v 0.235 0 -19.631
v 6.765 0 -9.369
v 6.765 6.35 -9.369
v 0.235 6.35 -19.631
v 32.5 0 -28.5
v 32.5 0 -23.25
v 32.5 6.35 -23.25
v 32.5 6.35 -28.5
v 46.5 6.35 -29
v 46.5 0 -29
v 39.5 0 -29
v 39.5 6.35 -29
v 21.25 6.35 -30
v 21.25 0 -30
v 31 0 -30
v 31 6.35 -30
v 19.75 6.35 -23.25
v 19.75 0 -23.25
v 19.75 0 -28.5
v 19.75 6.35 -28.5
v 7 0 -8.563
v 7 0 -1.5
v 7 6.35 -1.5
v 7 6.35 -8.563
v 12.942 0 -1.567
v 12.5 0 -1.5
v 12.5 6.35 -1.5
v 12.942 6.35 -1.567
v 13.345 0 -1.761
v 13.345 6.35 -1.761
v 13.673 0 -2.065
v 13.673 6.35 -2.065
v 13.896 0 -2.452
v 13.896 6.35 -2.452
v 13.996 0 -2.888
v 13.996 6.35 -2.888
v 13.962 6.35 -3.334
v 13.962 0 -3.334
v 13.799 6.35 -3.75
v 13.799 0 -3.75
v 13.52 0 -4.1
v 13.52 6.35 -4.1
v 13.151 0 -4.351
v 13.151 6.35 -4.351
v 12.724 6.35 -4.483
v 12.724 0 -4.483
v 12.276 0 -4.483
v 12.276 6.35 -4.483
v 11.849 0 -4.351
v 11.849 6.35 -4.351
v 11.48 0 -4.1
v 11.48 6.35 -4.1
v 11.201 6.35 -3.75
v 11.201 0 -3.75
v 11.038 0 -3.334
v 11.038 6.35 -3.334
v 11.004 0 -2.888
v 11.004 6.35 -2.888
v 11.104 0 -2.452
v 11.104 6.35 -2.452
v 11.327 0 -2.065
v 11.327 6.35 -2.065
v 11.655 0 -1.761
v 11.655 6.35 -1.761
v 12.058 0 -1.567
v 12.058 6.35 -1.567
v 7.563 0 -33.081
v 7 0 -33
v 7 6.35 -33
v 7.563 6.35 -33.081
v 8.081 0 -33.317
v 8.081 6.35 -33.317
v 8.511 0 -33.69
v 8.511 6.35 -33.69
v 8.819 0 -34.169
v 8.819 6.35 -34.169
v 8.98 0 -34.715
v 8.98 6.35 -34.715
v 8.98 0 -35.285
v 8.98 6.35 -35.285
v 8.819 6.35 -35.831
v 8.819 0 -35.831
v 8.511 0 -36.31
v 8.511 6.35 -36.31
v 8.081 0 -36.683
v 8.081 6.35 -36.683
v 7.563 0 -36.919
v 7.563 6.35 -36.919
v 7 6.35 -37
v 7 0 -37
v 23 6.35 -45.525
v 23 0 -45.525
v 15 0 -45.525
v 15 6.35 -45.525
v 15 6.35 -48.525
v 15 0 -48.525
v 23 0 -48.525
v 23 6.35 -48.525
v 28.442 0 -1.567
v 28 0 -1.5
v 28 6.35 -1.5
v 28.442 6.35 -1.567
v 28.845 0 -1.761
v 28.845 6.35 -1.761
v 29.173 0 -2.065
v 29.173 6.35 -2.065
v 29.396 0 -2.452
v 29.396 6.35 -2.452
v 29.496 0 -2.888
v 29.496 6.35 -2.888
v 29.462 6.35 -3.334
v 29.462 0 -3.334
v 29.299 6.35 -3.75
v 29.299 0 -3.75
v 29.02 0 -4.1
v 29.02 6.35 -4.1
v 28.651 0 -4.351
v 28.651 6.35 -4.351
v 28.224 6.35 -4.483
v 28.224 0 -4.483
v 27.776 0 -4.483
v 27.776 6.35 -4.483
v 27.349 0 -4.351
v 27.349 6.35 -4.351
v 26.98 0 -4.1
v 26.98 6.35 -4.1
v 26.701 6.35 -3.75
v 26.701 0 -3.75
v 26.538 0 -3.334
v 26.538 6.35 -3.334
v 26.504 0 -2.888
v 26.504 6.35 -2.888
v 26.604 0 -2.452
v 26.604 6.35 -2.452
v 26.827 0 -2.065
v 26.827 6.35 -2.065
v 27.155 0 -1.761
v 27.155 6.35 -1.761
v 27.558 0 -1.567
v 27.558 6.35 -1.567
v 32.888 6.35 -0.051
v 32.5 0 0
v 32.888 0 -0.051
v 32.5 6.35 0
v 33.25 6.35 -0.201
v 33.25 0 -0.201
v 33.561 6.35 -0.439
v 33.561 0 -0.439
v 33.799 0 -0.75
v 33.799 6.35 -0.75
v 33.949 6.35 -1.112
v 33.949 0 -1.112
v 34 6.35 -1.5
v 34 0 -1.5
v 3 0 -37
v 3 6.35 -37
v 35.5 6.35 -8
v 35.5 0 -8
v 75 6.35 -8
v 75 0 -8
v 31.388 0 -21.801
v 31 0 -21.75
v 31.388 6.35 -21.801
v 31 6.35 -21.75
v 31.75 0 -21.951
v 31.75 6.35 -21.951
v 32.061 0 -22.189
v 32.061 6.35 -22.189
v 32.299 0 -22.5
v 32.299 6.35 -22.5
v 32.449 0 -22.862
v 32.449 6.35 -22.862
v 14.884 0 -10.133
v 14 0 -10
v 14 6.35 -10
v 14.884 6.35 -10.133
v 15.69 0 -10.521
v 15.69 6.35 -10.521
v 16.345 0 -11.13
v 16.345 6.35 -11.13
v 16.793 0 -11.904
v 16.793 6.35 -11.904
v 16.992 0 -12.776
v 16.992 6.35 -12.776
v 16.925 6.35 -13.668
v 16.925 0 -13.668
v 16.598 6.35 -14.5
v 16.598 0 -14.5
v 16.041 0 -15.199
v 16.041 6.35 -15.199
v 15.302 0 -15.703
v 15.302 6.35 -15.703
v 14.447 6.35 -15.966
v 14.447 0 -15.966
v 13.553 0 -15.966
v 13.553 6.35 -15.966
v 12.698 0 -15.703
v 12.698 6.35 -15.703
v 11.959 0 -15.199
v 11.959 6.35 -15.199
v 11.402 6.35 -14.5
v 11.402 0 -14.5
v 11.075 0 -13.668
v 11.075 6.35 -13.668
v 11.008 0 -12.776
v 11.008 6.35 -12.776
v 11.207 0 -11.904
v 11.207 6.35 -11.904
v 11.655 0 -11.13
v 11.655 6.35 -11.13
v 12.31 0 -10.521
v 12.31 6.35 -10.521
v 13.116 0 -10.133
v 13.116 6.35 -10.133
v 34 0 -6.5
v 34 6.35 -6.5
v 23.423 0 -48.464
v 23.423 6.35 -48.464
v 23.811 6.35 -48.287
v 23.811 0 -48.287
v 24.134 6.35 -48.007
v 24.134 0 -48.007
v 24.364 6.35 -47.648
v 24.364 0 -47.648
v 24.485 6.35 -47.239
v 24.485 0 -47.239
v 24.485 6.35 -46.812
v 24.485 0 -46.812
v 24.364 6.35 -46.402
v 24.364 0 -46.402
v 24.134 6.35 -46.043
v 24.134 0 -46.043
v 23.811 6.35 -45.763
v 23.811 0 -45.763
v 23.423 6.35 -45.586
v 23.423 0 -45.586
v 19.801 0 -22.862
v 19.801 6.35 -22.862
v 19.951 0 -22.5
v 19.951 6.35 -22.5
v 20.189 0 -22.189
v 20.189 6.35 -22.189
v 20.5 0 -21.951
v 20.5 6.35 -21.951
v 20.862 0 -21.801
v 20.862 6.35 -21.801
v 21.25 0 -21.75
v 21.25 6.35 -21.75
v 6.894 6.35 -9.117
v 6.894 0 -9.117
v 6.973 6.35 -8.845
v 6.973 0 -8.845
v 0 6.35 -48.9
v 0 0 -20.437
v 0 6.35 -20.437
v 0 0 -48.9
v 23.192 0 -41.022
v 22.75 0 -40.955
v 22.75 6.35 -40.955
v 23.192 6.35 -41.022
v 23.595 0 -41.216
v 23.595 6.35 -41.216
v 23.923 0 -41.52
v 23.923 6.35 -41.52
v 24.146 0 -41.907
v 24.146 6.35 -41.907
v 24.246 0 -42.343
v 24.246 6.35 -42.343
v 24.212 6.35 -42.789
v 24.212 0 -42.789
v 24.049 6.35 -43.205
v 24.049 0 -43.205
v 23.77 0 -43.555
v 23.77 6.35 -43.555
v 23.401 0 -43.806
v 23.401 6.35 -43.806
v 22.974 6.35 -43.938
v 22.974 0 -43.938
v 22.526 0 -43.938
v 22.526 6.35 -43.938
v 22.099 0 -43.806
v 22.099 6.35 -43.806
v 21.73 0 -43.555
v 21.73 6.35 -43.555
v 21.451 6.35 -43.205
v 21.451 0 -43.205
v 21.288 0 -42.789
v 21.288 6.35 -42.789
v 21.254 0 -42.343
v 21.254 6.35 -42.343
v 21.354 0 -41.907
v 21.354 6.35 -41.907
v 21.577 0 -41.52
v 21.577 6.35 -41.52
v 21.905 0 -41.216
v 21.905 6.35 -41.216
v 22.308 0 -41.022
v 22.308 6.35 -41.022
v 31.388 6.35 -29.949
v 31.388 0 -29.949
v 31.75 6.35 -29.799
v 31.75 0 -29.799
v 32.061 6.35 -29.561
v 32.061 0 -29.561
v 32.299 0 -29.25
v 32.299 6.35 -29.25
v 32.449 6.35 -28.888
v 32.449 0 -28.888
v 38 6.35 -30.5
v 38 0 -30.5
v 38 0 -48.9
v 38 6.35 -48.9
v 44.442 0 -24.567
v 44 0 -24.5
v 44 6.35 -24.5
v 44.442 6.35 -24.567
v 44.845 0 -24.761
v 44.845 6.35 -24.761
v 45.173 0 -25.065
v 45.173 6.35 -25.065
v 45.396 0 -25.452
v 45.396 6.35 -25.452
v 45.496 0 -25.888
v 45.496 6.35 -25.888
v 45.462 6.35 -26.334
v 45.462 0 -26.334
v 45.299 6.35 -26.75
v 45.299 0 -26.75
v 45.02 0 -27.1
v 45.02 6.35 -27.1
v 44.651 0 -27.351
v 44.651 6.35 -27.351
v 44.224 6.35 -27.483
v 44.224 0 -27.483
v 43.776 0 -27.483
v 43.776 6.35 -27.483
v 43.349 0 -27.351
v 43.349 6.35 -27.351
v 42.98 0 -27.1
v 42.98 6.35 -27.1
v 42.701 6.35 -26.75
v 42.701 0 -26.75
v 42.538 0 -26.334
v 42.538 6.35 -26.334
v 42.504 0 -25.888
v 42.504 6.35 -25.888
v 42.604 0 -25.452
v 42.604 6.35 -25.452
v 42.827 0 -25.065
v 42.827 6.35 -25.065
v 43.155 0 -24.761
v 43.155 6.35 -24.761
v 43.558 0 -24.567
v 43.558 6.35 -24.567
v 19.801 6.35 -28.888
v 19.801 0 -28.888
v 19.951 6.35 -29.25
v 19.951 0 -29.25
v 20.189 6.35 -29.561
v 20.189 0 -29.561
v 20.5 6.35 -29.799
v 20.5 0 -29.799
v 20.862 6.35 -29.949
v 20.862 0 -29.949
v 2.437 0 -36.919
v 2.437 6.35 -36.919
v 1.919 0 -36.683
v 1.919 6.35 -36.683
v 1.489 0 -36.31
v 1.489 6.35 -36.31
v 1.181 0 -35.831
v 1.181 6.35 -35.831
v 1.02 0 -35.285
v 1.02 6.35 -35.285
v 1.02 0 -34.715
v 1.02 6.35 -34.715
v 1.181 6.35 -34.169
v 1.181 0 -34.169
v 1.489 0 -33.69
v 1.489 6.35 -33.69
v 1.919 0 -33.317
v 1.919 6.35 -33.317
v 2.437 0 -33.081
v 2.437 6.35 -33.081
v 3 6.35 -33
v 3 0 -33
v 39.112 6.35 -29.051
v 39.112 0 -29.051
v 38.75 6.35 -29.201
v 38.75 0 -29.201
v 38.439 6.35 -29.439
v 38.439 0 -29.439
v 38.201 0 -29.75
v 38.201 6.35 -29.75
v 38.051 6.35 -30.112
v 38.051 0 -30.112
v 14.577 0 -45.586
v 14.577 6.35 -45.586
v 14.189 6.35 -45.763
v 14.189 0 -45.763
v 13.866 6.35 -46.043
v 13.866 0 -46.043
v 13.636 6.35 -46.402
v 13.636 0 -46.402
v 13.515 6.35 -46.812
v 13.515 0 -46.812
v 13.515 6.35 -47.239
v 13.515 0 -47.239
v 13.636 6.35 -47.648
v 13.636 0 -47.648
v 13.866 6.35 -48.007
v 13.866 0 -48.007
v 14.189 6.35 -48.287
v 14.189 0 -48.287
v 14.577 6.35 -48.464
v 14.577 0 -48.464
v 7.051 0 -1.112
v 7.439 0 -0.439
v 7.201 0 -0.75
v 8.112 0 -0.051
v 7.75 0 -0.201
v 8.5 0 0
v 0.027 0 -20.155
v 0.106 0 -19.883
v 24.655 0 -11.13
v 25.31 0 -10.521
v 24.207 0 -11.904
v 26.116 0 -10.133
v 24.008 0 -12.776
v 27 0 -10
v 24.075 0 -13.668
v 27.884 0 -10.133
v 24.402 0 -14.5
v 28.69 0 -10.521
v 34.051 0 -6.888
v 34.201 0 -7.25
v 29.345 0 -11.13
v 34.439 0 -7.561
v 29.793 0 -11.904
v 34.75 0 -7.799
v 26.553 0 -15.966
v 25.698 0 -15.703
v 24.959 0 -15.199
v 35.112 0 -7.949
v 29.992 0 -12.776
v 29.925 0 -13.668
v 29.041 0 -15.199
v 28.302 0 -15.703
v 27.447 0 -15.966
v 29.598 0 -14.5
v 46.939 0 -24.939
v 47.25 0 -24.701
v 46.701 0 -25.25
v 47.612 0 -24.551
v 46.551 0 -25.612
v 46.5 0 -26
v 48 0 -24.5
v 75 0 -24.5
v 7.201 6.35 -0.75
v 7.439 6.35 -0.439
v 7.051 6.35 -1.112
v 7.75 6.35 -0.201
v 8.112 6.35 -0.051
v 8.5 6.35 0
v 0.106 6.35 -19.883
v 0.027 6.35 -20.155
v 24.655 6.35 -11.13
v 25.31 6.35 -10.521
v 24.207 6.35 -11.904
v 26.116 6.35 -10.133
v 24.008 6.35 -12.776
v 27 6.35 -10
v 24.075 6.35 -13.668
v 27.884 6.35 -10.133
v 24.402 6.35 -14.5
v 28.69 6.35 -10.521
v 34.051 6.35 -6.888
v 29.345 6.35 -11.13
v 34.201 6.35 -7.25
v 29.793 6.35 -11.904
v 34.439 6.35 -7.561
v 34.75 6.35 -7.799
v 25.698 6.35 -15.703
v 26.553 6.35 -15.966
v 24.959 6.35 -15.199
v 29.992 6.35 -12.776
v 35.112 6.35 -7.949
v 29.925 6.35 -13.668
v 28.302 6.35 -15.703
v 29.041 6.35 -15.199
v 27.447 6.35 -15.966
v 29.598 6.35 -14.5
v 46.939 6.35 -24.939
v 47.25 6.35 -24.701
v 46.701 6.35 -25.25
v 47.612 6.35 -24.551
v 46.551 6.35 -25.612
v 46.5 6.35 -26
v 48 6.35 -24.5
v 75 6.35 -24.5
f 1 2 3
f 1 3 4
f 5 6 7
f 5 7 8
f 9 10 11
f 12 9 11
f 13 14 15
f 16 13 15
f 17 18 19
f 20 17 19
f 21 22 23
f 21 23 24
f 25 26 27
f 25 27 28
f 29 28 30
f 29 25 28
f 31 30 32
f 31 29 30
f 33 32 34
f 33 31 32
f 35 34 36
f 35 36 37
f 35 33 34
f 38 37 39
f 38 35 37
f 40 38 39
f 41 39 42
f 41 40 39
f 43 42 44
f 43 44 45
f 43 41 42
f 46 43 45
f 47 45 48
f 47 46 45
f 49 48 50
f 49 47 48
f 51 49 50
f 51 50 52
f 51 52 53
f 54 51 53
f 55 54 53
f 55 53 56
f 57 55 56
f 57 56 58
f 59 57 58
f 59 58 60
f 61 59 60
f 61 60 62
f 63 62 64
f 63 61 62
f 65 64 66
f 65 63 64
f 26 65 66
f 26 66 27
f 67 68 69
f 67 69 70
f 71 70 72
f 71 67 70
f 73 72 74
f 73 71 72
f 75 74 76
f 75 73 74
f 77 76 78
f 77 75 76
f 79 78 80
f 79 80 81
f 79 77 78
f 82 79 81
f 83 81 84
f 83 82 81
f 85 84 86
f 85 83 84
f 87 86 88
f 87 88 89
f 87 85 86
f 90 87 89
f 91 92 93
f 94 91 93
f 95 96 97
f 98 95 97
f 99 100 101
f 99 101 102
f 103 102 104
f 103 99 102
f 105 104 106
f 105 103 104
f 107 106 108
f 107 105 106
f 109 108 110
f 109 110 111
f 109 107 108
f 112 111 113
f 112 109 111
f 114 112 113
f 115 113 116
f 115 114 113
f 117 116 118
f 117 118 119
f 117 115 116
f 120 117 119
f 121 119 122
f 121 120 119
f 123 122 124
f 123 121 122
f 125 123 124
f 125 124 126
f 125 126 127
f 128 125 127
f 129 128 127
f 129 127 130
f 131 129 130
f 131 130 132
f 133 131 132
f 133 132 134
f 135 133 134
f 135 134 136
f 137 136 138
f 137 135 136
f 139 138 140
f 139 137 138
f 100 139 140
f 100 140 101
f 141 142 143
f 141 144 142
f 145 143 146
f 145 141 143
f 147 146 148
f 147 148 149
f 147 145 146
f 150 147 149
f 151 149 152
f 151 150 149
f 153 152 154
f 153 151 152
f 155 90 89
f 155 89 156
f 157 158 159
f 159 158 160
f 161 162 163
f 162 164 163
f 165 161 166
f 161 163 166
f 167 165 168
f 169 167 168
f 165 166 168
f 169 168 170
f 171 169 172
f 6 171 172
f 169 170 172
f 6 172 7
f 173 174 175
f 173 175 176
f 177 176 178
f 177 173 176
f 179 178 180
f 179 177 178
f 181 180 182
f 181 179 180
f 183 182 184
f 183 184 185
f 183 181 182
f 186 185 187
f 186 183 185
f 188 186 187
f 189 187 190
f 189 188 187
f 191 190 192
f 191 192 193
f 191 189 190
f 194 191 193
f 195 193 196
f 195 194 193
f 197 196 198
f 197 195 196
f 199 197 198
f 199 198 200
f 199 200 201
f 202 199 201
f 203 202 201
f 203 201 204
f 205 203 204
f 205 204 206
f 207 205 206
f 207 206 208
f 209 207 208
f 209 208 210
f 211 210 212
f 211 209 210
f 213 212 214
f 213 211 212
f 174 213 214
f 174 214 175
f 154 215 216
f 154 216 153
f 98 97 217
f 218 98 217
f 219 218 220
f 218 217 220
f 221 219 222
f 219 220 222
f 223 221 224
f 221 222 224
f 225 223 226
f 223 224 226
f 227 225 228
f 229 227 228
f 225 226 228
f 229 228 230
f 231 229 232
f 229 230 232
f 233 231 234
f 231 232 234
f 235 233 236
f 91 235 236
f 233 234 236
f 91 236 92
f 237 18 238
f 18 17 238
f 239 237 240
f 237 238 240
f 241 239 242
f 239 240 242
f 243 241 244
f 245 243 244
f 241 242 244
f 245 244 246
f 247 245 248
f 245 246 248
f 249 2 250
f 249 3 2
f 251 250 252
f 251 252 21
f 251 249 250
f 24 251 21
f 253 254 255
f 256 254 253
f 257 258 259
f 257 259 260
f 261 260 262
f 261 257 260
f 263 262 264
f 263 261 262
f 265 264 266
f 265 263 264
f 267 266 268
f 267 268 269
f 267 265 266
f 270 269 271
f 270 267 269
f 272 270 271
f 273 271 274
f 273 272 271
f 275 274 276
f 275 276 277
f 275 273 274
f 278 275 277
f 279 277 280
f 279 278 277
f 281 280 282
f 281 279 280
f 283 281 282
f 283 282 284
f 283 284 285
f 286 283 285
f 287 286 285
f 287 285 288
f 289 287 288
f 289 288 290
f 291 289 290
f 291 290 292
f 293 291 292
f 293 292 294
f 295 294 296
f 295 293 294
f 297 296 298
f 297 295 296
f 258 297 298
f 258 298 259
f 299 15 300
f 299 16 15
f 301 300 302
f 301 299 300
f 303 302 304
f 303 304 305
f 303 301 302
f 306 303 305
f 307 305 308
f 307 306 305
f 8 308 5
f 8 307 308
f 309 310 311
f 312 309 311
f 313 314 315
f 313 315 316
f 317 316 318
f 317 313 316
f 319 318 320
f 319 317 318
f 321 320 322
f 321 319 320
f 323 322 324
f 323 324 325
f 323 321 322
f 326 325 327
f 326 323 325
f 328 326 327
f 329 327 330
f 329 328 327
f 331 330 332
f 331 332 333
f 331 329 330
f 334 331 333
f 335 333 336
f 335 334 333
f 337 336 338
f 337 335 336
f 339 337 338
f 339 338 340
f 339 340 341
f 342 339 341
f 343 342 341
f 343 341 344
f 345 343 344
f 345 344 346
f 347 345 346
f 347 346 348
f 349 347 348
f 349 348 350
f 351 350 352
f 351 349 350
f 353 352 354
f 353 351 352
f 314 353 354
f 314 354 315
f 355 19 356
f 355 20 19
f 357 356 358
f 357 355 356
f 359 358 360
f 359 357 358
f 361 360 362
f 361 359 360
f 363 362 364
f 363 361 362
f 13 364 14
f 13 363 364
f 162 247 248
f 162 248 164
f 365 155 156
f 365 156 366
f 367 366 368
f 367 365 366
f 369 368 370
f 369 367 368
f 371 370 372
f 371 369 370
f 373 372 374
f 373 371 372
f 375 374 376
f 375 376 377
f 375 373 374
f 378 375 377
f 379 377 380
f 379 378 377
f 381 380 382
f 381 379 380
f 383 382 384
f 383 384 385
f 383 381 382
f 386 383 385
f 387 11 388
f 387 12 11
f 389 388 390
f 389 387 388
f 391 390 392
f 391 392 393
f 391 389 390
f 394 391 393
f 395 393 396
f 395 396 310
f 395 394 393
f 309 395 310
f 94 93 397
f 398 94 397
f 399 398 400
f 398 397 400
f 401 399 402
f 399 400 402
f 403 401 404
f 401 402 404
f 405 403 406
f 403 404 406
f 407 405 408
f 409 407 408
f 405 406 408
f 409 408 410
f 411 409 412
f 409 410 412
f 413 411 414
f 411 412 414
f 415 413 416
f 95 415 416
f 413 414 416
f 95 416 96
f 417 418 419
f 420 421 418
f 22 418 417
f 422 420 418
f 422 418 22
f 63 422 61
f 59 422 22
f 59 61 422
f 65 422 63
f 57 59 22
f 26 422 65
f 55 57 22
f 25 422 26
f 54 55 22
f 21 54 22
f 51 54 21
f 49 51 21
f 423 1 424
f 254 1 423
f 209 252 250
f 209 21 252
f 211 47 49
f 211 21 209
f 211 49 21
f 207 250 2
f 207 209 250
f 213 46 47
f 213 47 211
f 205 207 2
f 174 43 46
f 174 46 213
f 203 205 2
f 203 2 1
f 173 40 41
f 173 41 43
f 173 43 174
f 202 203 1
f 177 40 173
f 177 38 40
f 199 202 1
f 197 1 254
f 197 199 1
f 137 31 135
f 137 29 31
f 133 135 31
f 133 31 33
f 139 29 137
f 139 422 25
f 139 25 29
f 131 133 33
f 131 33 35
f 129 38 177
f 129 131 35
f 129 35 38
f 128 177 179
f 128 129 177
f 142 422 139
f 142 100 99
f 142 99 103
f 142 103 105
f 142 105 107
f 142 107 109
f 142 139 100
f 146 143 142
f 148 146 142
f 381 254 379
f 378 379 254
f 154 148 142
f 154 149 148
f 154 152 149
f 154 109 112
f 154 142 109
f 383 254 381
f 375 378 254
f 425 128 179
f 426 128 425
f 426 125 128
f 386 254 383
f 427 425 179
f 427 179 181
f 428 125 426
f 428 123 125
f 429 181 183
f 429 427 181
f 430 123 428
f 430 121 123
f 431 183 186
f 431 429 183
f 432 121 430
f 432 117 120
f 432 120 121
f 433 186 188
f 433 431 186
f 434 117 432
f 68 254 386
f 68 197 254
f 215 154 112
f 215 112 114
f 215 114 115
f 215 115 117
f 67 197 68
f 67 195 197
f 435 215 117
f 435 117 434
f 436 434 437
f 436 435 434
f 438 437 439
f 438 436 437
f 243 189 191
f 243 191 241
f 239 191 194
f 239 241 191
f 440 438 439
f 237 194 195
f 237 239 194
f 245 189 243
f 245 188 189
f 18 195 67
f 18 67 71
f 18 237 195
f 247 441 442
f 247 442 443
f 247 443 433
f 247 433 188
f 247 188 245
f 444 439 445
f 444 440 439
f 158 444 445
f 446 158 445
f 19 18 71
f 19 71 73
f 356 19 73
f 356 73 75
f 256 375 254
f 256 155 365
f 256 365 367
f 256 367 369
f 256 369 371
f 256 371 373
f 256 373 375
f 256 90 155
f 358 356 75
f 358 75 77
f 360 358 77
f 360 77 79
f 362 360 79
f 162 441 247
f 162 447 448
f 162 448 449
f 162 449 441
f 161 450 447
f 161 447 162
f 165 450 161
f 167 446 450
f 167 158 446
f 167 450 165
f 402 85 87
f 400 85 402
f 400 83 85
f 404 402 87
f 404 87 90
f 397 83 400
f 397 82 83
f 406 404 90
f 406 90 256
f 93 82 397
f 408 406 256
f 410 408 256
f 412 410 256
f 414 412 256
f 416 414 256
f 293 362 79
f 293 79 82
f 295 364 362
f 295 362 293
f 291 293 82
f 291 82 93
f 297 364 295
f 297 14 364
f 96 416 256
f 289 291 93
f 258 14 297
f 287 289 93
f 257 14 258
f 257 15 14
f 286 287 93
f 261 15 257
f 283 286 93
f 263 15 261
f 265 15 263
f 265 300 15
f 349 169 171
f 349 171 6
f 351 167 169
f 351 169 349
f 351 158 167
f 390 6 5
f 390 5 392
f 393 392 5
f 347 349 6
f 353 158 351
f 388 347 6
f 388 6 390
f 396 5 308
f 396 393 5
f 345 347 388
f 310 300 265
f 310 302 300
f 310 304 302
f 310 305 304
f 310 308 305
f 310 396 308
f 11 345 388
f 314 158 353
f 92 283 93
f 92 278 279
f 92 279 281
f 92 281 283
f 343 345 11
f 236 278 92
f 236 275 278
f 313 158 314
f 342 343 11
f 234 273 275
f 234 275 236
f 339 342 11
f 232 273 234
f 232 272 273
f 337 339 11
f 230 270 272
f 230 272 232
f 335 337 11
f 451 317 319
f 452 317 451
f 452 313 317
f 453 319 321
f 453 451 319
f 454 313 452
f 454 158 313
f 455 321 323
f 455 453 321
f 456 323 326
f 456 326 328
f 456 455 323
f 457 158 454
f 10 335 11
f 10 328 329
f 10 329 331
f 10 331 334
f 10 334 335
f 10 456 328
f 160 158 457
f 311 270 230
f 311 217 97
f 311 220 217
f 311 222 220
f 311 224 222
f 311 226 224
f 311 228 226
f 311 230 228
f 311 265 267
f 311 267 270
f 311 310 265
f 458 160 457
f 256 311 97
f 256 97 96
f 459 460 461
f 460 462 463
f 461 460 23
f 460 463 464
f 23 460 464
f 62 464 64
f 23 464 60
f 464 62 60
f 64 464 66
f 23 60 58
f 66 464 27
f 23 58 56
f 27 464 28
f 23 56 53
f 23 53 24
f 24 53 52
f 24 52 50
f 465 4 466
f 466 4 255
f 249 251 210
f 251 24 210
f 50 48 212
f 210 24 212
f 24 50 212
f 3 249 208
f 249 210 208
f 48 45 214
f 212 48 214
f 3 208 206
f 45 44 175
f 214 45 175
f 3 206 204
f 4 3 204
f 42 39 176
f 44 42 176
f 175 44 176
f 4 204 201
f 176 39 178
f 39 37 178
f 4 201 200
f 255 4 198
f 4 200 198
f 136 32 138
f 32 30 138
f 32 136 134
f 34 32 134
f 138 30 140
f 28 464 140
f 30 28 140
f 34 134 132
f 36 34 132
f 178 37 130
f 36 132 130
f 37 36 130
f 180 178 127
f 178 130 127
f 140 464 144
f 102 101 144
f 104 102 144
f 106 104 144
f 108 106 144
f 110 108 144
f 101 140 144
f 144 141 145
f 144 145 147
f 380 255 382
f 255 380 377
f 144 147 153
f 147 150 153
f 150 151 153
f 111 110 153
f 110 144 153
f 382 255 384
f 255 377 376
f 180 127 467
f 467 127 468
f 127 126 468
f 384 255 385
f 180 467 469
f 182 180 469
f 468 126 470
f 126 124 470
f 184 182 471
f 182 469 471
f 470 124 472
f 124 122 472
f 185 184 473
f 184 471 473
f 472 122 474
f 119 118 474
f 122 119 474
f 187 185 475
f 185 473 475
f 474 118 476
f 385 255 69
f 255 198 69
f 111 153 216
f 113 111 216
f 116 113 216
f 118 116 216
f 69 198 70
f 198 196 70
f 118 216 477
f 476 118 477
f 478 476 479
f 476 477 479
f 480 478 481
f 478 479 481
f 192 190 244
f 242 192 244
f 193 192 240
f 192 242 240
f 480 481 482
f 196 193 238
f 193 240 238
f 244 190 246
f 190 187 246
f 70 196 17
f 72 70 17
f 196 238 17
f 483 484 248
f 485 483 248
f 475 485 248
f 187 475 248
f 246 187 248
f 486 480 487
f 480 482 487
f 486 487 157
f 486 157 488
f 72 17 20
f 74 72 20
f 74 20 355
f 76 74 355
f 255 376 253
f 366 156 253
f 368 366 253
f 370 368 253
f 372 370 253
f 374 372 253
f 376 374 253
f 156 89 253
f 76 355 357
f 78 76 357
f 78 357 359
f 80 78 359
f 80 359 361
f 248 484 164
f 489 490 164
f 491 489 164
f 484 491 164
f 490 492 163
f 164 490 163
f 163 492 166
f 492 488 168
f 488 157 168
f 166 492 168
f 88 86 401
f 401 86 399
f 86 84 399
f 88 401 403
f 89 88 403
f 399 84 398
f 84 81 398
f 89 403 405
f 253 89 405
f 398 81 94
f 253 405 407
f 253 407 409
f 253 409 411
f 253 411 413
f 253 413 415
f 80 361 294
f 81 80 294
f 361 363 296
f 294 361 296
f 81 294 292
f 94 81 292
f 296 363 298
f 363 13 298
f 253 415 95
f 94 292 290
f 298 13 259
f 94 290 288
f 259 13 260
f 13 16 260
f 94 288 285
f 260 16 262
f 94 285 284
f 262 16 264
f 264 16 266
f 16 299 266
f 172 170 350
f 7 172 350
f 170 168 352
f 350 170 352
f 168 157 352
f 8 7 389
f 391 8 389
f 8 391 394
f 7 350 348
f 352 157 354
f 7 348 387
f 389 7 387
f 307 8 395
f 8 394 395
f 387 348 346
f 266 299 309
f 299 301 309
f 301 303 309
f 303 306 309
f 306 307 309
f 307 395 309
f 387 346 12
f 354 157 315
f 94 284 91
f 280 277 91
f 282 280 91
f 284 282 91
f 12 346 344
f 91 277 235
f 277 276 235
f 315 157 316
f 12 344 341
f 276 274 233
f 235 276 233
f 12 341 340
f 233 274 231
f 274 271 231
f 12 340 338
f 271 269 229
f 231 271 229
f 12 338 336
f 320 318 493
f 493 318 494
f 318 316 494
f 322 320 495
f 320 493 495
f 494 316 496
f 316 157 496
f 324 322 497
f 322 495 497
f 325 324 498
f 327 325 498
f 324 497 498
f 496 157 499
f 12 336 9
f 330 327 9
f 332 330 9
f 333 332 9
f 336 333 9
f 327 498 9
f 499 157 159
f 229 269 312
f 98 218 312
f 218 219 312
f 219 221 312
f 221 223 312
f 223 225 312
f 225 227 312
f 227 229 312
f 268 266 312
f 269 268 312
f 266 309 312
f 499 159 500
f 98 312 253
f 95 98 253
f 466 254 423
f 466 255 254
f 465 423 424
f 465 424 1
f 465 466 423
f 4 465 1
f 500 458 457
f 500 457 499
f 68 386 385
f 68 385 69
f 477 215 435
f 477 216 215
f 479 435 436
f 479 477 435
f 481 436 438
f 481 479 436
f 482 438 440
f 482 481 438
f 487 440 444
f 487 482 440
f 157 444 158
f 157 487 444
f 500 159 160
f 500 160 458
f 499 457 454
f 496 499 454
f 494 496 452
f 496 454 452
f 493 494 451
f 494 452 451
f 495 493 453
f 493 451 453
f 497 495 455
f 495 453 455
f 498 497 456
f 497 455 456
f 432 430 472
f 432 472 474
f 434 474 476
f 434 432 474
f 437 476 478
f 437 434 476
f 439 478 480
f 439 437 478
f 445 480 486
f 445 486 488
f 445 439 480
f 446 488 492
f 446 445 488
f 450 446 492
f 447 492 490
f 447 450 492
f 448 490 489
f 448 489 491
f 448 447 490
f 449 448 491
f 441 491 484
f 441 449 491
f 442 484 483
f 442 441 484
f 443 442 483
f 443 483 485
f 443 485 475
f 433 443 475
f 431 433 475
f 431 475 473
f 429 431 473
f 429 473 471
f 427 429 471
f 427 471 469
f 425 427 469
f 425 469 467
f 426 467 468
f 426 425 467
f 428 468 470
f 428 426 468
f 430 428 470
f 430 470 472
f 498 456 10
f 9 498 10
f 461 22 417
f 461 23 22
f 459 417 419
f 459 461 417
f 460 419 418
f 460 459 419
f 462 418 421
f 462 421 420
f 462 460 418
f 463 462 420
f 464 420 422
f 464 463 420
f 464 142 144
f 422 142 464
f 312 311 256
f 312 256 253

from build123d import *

# Parameters (mm, degrees)
SKETCH1_R               = 1.5
SKETCH1_R_2             = 3
SKETCH1_R_3             = 2
SKETCH1_W               = 12.75
SKETCH1_H               = 8.25
BOSS_EXTRUDE1_DEPTH     = 6.35
FILLET1_R               = 1.5
SKETCH3_W               = 129.678218063
SKETCH3_H               = 13.276015012
CUT_EXTRUDE1_DEPTH      = 56
SKETCH4_W               = 14.25
SKETCH4_H               = 6.35
SKETCH4_W_2             = 20.25
SKETCH4_W_3             = 16.5
BOSS_EXTRUDE2_DEPTH     = 25
SKETCH5_W               = 158.83803675
SKETCH5_H               = 69.224935419
CUT_EXTRUDE2_DEPTH      = 86
CUT_EXTRUDE3_DEPTH      = 10
CUT_EXTRUDE3_DEPTH_BACK = 49
SKETCH6_W               = 0.1
SKETCH6_H               = 6.35
SKETCH7_W               = 88.464513538
SKETCH7_H               = 23.115624737
CUT_EXTRUDE4_DEPTH      = 84


with BuildPart() as part:
    # Sketch1 → Boss-Extrude1 (new body)
    with BuildSketch(Plane(origin=(0, 0, 0), x_dir=(1, 0, 0), z_dir=(0, 1, 0))):
        Polygon((0, 20), (0, 104), (12, 104), (14, 93), (26, 93), (26, 107), (33.5, 114), (62.5, 114), (70, 107), (70, 93), (82, 93), (84, 104), (96, 104), (96, 20), (89, 9), (89, 0), (62, 0), (62, 8), (34, 8), (34, 0), (7, 0), (7, 9), align=None)
        with Locations(Location((12.5, 3, 0), (0, 0, 270))):
            Circle(SKETCH1_R, mode=Mode.SUBTRACT)
        with Locations(Location((28, 3, 0), (0, 0, 270))):
            Circle(SKETCH1_R, mode=Mode.SUBTRACT)
        with Locations(Location((68, 3, 0), (0, 0, 90))):
            Circle(SKETCH1_R, mode=Mode.SUBTRACT)
        with Locations(Location((83.5, 3, 0), (0, 0, 90))):
            Circle(SKETCH1_R, mode=Mode.SUBTRACT)
        with Locations(Location((14, 13, 0), (0, 0, 270))):
            Circle(SKETCH1_R_2, mode=Mode.SUBTRACT)
        with Locations(Location((27, 13, 0), (0, 0, 270))):
            Circle(SKETCH1_R_2, mode=Mode.SUBTRACT)
        with Locations(Location((69, 13, 0), (0, 0, 90))):
            Circle(SKETCH1_R_2, mode=Mode.SUBTRACT)
        with Locations(Location((82, 13, 0), (0, 0, 90))):
            Circle(SKETCH1_R_2, mode=Mode.SUBTRACT)
        with Locations(Location((22.75, 42.455027657, 0), (0, 0, 270))):
            Circle(SKETCH1_R, mode=Mode.SUBTRACT)
        with Locations(Location((22.75, 51.751081058, 0), (0, 0, 270))):
            Circle(SKETCH1_R, mode=Mode.SUBTRACT)
        with Locations(Location((73.25, 42.455027657, 0), (0, 0, 90))):
            Circle(SKETCH1_R, mode=Mode.SUBTRACT)
        with Locations(Location((73.25, 51.751081058, 0), (0, 0, 90))):
            Circle(SKETCH1_R, mode=Mode.SUBTRACT)
        with Locations(Location((18, 72.75, 0), (0, 0, 270))):
            Circle(SKETCH1_R, mode=Mode.SUBTRACT)
        with Locations(Location((28, 65.75, 0), (0, 0, 270))):
            Circle(SKETCH1_R, mode=Mode.SUBTRACT)
        with Locations(Location((68, 65.75, 0), (0, 0, 90))):
            Circle(SKETCH1_R, mode=Mode.SUBTRACT)
        with Locations(Location((78, 72.75, 0), (0, 0, 90))):
            Circle(SKETCH1_R, mode=Mode.SUBTRACT)
        with Locations(Location((36.5, 76.75, 0), (0, 0, 270))):
            Circle(SKETCH1_R_3, mode=Mode.SUBTRACT)
        with Locations(Location((59.5, 76.75, 0), (0, 0, 90))):
            Circle(SKETCH1_R_3, mode=Mode.SUBTRACT)
        with Locations(Location((35.5, 89, 0), (0, 0, 270))):
            Circle(SKETCH1_R, mode=Mode.SUBTRACT)
        with Locations(Location((35.5, 106.5, 0), (0, 0, 270))):
            Circle(SKETCH1_R, mode=Mode.SUBTRACT)
        with Locations(Location((60.5, 89, 0), (0, 0, 90))):
            Circle(SKETCH1_R, mode=Mode.SUBTRACT)
        with Locations(Location((60.5, 106.5, 0), (0, 0, 90))):
            Circle(SKETCH1_R, mode=Mode.SUBTRACT)
        with Locations(Location((44, 26, 0), (0, 0, 270))):
            Circle(SKETCH1_R, mode=Mode.SUBTRACT)
        with Locations(Location((52, 26, 0), (0, 0, 90))):
            Circle(SKETCH1_R, mode=Mode.SUBTRACT)
        with Locations(Location((52, 74, 0), (0, 0, 270))):
            Circle(SKETCH1_R, mode=Mode.SUBTRACT)
        with Locations(Location((44, 74, 0), (0, 0, 90))):
            Circle(SKETCH1_R, mode=Mode.SUBTRACT)
        with Locations(Location((48, 97.75, 0), (0, 0, 270))):
            Circle(SKETCH1_R_3, mode=Mode.SUBTRACT)
        with Locations((69.875, 25.875)):
            Rectangle(SKETCH1_W, SKETCH1_H, mode=Mode.SUBTRACT)
        with Locations((26.125, 25.875)):
            Rectangle(SKETCH1_W, SKETCH1_H, mode=Mode.SUBTRACT)
        with Locations((69.875, 81.875)):
            Rectangle(SKETCH1_W, SKETCH1_H, mode=Mode.SUBTRACT)
        with Locations((26.125, 81.875)):
            Rectangle(SKETCH1_W, SKETCH1_H, mode=Mode.SUBTRACT)
        with BuildLine():
            Line((3, 75), (7, 75))
            ThreePointArc((7, 75), (9, 73), (7, 71))
            Line((7, 71), (3, 71))
            ThreePointArc((3, 71), (1, 73), (3, 75))
        make_face(mode=Mode.SUBTRACT)
        with BuildLine():
            Line((93, 75), (89, 75))
            ThreePointArc((89, 75), (87, 73), (89, 71))
            Line((89, 71), (93, 71))
            ThreePointArc((93, 71), (95, 73), (93, 75))
        make_face(mode=Mode.SUBTRACT)
        with BuildLine():
            Line((93, 37), (89, 37))
            ThreePointArc((89, 37), (87, 35), (89, 33))
            Line((89, 33), (93, 33))
            ThreePointArc((93, 33), (95, 35), (93, 37))
        make_face(mode=Mode.SUBTRACT)
        with BuildLine():
            Line((3, 33), (7, 33))
            ThreePointArc((7, 33), (9, 35), (7, 37))
            Line((7, 37), (3, 37))
            ThreePointArc((3, 37), (1, 35), (3, 33))
        make_face(mode=Mode.SUBTRACT)
        with BuildLine():
            Line((15, 48.525154469), (23, 48.525154469))
            ThreePointArc((23, 48.525154469), (24.5, 47.025154469), (23, 45.525154469))
            Line((23, 45.525154469), (15, 45.525154469))
            ThreePointArc((15, 45.525154469), (13.5, 47.025154469), (15, 48.525154469))
        make_face(mode=Mode.SUBTRACT)
        with BuildLine():
            Line((81, 48.525154469), (73, 48.525154469))
            ThreePointArc((73, 48.525154469), (71.5, 47.025154469), (73, 45.525154469))
            Line((73, 45.525154469), (81, 45.525154469))
            ThreePointArc((81, 45.525154469), (82.5, 47.025154469), (81, 48.525154469))
        make_face(mode=Mode.SUBTRACT)
        with BuildLine():
            Line((16.5, 67.75), (16.5, 57.75))
            ThreePointArc((16.5, 57.75), (18, 56.25), (19.5, 57.75))
            Line((19.5, 57.75), (19.5, 67.75))
            ThreePointArc((19.5, 67.75), (18, 69.25), (16.5, 67.75))
        make_face(mode=Mode.SUBTRACT)
        with BuildLine():
            Line((76.5, 67.75), (76.5, 57.75))
            ThreePointArc((76.5, 57.75), (78, 56.25), (79.5, 57.75))
            Line((79.5, 57.75), (79.5, 67.75))
            ThreePointArc((79.5, 67.75), (78, 69.25), (76.5, 67.75))
        make_face(mode=Mode.SUBTRACT)
        with BuildLine():
            Line((46.5, 29), (38, 29))
            Line((38, 29), (38, 71))
            Line((38, 71), (46.5, 71))
            Line((46.5, 71), (46.5, 74))
            ThreePointArc((46.5, 74), (48, 75.5), (49.5, 74))
            Line((49.5, 74), (49.5, 71))
            Line((49.5, 71), (58, 71))
            Line((58, 71), (58, 29))
            Line((58, 29), (49.5, 29))
            Line((49.5, 29), (49.5, 26))
            ThreePointArc((49.5, 26), (48, 24.5), (46.5, 26))
            Line((46.5, 26), (46.5, 29))
        make_face(mode=Mode.SUBTRACT)
    extrude(amount=BOSS_EXTRUDE1_DEPTH)

    # Fillet1
    fillet1_edges = [part.edges().sort_by_distance(p)[0] for p in [
        (19.75, 3.175, -30),
        (19.75, 3.175, -21.75),
        (32.5, 3.175, -21.75),
        (32.5, 3.175, -30),
        (63.5, 3.175, -77.75),
        (76.25, 3.175, -77.75),
        (76.25, 3.175, -86),
        (63.5, 3.175, -86),
        (19.75, 3.175, -86),
        (19.75, 3.175, -77.75),
        (32.5, 3.175, -77.75),
        (32.5, 3.175, -86),
        (58, 3.175, -29),
        (58, 3.175, -71),
        (38, 3.175, -71),
        (38, 3.175, -29),
        (62, 3.175, -8),
        (34, 3.175, -8),
        (34, 3.175, 0),
        (7, 3.175, 0),
        (7, 3.175, -9),
        (0, 3.175, -20),
        (0, 3.175, -104),
        (12, 3.175, -104),
        (14, 3.175, -93),
        (26, 3.175, -93),
        (26, 3.175, -107),
        (33.5, 3.175, -114),
        (62.5, 3.175, -114),
        (70, 3.175, -107),
        (70, 3.175, -93),
        (82, 3.175, -93),
        (84, 3.175, -104),
        (96, 3.175, -104),
        (96, 3.175, -20),
        (89, 3.175, -9),
        (89, 3.175, 0),
        (62, 3.175, 0),
        (76.25, 3.175, -21.75),
        (76.25, 3.175, -30),
        (63.5, 3.175, -30),
        (63.5, 3.175, -21.75),
    ]]
    fillet(fillet1_edges, radius=FILLET1_R)

    # Sketch3 → Cut-Extrude1 (cut)
    with BuildSketch(Plane(origin=(48, 0, 0), x_dir=(0, 0, -1), z_dir=(1, 0, 0))):
        with Locations((58.42243018, 0.940732076)):
            Rectangle(SKETCH3_W, SKETCH3_H)
    extrude(amount=CUT_EXTRUDE1_DEPTH, mode=Mode.SUBTRACT)

    # Sketch4 → Boss-Extrude2 (add)
    with BuildSketch(Plane(origin=(48, 0, 0), x_dir=(0, 0, -1), z_dir=(1, 0, 0))):
        with Locations((106.875, 3.175)):
            Rectangle(SKETCH4_W, SKETCH4_H)
        with Locations((85.625, 3.175)):
            Rectangle(SKETCH4_W_2, SKETCH4_H)
        with Locations((16.25, 3.175)):
            Rectangle(SKETCH4_W_3, SKETCH4_H)
    extrude(amount=BOSS_EXTRUDE2_DEPTH)

    # Mirror1: part across plane


with BuildPart() as part_1:
    add(part.part)
    add(part.part.mirror(Plane(origin=(73, 0, 0), x_dir=(0, 0, 1), z_dir=(1, 0, 0))))

    # Sketch5 → Cut-Extrude2 (cut)
    with BuildSketch(Plane(origin=(75, 0, 0), x_dir=(0, 0, -1), z_dir=(1, 0, 0))):
        with Locations((54.73207584, 3.767679241)):
            Rectangle(SKETCH5_W, SKETCH5_H)
    extrude(amount=CUT_EXTRUDE2_DEPTH, mode=Mode.SUBTRACT)

    # Sketch6 → Cut-Extrude3 (cut, two sides: drawn at the far end of the back side and taken through both)
    with BuildSketch(Plane(origin=(38, 0, 0), x_dir=(0, 0, -1), z_dir=(1, 0, 0)).offset(-CUT_EXTRUDE3_DEPTH_BACK)):
        with Locations((48.95, 3.175)):
            Rectangle(SKETCH6_W, SKETCH6_H)
    extrude(amount=CUT_EXTRUDE3_DEPTH + CUT_EXTRUDE3_DEPTH_BACK, mode=Mode.SUBTRACT)


with BuildPart() as cut_extrude3_piece_1:
    # of the separate pieces the step leaves, piece 1, a body of its own (cut_extrude3_pieces)
    add(part_1.part.solids().sort_by_distance((0, 0, -49))[0])

    # Sketch7 → Cut-Extrude4 (cut)
    with BuildSketch(Plane(origin=(0, 0, -48.91), x_dir=(-1, 0, 0), z_dir=(0, 0, -1))):
        with Locations((-38.621683349, 5.173992705)):
            Rectangle(SKETCH7_W, SKETCH7_H)
    extrude(amount=CUT_EXTRUDE4_DEPTH, mode=Mode.SUBTRACT)


with BuildPart() as cut_extrude3_piece_2:
    # of the separate pieces the step leaves, piece 2, a body of its own (cut_extrude3_pieces)
    add(part_1.part.solids().sort_by_distance((0, 0, -20.436801031))[0])


solid = cut_extrude3_piece_2.part
